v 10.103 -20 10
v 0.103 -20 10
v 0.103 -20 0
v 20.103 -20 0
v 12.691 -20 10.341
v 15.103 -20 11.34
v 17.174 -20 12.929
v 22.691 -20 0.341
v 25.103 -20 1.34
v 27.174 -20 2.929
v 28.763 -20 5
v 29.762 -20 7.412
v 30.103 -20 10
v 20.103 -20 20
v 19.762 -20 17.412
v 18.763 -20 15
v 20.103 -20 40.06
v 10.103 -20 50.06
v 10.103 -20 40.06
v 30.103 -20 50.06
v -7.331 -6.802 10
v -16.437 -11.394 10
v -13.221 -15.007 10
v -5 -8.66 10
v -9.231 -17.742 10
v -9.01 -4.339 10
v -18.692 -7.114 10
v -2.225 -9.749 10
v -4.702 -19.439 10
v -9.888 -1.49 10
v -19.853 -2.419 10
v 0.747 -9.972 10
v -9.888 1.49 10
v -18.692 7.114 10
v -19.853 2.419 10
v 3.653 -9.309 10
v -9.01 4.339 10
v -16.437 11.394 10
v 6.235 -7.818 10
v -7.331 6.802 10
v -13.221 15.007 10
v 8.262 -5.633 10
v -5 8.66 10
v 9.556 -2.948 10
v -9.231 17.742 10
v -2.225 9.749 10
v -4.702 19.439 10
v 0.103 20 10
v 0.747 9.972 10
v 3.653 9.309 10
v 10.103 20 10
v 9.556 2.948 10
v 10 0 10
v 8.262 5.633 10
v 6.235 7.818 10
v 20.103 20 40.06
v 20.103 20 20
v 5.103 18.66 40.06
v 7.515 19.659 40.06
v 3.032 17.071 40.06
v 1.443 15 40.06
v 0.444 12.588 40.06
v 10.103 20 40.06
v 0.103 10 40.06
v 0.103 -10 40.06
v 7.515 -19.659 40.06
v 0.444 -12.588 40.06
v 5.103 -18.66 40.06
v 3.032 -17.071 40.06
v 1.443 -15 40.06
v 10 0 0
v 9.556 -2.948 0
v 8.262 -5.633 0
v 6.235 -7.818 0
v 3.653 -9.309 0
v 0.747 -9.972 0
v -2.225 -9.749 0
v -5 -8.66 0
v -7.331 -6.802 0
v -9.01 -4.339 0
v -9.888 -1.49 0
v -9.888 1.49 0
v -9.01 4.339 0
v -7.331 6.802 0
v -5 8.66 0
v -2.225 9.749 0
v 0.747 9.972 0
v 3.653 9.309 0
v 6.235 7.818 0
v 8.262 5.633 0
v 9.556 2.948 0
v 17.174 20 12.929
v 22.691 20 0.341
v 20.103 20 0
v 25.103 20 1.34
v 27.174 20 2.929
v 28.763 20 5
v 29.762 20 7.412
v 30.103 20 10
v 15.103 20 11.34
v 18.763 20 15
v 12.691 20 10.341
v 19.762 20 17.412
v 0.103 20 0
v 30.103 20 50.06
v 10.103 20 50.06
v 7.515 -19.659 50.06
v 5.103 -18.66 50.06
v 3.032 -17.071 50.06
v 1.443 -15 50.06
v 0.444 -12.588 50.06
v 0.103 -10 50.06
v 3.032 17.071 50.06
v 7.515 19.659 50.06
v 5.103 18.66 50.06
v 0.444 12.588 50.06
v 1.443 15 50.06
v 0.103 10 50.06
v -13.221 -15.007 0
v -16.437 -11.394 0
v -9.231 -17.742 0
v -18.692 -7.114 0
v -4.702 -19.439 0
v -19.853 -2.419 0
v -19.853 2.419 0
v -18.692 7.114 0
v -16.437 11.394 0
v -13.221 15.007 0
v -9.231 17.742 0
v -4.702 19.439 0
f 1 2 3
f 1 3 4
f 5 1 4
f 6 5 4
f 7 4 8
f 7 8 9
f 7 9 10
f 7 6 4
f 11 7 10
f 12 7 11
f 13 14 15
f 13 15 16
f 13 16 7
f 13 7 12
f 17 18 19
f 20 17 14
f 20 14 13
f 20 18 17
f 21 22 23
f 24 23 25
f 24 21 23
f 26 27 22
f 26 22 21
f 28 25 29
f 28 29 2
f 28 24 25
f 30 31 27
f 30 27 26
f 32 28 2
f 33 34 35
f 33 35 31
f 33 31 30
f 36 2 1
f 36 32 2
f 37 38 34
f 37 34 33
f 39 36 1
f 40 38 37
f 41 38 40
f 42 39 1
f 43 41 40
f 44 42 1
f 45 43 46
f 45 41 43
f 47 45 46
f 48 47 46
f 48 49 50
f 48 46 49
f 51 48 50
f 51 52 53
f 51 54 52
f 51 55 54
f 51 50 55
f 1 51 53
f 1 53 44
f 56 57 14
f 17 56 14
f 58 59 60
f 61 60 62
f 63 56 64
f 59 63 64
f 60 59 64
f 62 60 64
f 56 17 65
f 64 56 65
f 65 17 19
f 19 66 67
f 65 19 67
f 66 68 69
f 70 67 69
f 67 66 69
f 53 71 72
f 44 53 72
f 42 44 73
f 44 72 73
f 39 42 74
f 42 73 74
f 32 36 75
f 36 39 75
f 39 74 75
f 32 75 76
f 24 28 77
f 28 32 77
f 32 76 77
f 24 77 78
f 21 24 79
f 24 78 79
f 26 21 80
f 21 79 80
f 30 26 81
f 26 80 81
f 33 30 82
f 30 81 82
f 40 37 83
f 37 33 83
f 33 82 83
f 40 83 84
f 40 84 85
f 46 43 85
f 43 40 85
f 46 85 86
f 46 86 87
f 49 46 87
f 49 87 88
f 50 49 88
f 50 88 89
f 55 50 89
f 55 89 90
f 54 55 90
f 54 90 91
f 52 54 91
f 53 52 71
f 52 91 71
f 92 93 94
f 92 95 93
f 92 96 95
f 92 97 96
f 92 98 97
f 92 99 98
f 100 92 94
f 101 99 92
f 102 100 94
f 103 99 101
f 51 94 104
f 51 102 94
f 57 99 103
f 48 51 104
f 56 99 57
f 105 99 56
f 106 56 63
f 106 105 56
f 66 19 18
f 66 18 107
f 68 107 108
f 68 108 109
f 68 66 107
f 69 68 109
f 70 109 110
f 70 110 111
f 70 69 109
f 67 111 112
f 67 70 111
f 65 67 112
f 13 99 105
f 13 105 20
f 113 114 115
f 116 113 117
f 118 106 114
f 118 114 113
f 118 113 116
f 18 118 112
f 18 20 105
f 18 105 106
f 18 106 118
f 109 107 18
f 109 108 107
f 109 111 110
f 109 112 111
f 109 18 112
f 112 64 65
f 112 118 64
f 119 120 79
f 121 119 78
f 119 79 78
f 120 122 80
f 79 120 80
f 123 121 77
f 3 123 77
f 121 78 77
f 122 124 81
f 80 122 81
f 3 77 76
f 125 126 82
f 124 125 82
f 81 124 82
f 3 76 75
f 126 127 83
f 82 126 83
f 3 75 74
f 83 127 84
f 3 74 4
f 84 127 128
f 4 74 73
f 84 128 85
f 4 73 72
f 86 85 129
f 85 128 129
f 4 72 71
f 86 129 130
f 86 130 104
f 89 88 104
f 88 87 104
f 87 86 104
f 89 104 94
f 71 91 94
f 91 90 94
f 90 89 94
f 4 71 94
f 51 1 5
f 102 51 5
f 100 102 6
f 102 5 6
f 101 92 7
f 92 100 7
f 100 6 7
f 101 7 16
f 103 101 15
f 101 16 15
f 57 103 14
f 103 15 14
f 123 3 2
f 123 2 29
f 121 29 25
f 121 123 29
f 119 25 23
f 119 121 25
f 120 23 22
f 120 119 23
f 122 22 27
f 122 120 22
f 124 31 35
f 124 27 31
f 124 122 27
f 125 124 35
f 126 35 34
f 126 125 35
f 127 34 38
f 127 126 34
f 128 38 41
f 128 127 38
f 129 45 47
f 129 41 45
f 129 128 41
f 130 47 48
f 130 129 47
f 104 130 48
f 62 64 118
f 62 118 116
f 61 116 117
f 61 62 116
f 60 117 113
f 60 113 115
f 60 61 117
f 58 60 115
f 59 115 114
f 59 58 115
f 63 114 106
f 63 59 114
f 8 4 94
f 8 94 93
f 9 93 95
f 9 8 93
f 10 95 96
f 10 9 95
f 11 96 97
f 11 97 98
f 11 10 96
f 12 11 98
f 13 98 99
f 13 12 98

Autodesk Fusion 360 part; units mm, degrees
sketch "Sketch1" plane through (0, 0, 0) normal (0, 0, 1) x (1, 0, 0) in component "Exercise3"
  circle A0 centre (0, 0) radius 10
  line L0 (0, 0) -> (30, 0) construction
  line L1 (0.1031, 19.9997) -> (30.1031, 19.9997)
  line L2 (0.1031, -19.9997) -> (30.1031, -19.9997)
  line L3 (30.1031, 19.9997) -> (30.1031, -20.0003)
  arc A1 (0.1031, 19.9997) -> (0.1031, -19.9997) centre (0, 0) ccw
  line L4 (20.1031, 19.9997) -> (20.1031, -19.9997)
  dimension "d1" = 20
  dimension "d2" = 40
  dimension "d3" = 30
  dimension "d4" = 30
  dimension "d5" = 30
  dimension "d6" = 40
  dimension "d7" = 10
extrude "Extrude1" add sketch "Sketch1" along normal blind 10 contours L1 L2 A1 L4 in component "Exercise3"
extrude "Extrude2" add sketch "Sketch1" along normal blind 50.06 contours L1 L2 L3 L4 in component "Exercise3"
fillet "Fillet1" radius 10 1 edges at (30.1031, 0, 0) in component "Exercise3"
sketch "Sketch2" plane through (0, 0, 50.06) normal (0, 0, 1) x (-1, 0, 0) in component "Exercise3"
  line L0 (-30.1031, -19.9997) -> (-20.1031, -19.9997)
  line L1 (-20.1031, -19.9997) -> (-20.1031, 19.9997)
  line L2 (-20.1031, 19.9997) -> (-30.1031, 19.9997)
  line L3 (-30.1031, 19.9997) -> (-30.1031, -19.9997)
  line L4 (-30.1031, 0) -> (0, 0) construction
  line L5 (-30.1031, -19.9997) -> (-0.1031, -19.9997)
  line L6 (-0.1031, -19.9997) -> (-0.1031, 19.9997)
  line L7 (-0.1031, 19.9997) -> (-30.1031, 19.9997)
  line L8 (-30.1031, 19.9997) -> (-30.1031, -19.9997)
  dimension "d13" = 30
extrude "Extrude3" add sketch "Sketch2" against normal blind 10 contours L1 L5 L6 L7 in component "Exercise3"
fillet "Fillet2" radius 10 2 edges at (0.1031, -19.9997, 45.06) (0.1031, 19.9997, 45.06) in component "Exercise3"
fillet "Fillet3" radius 10 1 edges at (20.1031, 0, 10) in component "Exercise3"
component "Exercise3" placed x (1, 0, 0) y (0, 1, 0) z (0, 0, 1) at (0, 0, 0)
